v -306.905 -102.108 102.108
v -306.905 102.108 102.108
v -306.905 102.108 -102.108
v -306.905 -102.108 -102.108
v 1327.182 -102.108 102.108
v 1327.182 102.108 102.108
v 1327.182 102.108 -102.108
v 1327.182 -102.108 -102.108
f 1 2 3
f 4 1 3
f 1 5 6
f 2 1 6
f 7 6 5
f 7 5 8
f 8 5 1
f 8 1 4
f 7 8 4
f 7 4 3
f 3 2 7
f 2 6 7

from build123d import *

# Parameters (mm, degrees)
LOFT1_START         = -0.580963743
LOFT1_OUTLINE_W     = 204.216
LOFT1_OUTLINE_H     = 204.216
LOFT1_DEPTH         = 1021.439287056
SKETCH3_3_W         = 204.216
SKETCH3_3_H         = 204.216
BOSS_EXTRUDE3_DEPTH = 306.324
SKETCH2_4_W         = 204.216
SKETCH2_4_H         = 204.216
BOSS_EXTRUDE5_DEPTH = 306.324


# Read off the part's stored shape, not the designer's step: Loft1
with BuildPart() as part:
    # Loft1 outline → Loft1 (new body)
    with BuildSketch(Plane.YZ.offset(LOFT1_START)):
        Rectangle(LOFT1_OUTLINE_W, LOFT1_OUTLINE_H)
    extrude(amount=LOFT1_DEPTH)

    # Sketch3<3> → Boss-Extrude3 (add)
    with BuildSketch(Plane(origin=(1020.858323313, 0, 0), x_dir=(0, 0, -1), z_dir=(1, 0, 0))):
        Rectangle(SKETCH3_3_W, SKETCH3_3_H)
    extrude(amount=BOSS_EXTRUDE3_DEPTH)

    # Sketch2<4> → Boss-Extrude5 (add)
    with BuildSketch(Plane(origin=(-0.580963743, 0, 0), x_dir=(0, 0, -1), z_dir=(1, 0, 0))):
        Rectangle(SKETCH2_4_W, SKETCH2_4_H)
    extrude(amount=-BOSS_EXTRUDE5_DEPTH)


solid = part.part
